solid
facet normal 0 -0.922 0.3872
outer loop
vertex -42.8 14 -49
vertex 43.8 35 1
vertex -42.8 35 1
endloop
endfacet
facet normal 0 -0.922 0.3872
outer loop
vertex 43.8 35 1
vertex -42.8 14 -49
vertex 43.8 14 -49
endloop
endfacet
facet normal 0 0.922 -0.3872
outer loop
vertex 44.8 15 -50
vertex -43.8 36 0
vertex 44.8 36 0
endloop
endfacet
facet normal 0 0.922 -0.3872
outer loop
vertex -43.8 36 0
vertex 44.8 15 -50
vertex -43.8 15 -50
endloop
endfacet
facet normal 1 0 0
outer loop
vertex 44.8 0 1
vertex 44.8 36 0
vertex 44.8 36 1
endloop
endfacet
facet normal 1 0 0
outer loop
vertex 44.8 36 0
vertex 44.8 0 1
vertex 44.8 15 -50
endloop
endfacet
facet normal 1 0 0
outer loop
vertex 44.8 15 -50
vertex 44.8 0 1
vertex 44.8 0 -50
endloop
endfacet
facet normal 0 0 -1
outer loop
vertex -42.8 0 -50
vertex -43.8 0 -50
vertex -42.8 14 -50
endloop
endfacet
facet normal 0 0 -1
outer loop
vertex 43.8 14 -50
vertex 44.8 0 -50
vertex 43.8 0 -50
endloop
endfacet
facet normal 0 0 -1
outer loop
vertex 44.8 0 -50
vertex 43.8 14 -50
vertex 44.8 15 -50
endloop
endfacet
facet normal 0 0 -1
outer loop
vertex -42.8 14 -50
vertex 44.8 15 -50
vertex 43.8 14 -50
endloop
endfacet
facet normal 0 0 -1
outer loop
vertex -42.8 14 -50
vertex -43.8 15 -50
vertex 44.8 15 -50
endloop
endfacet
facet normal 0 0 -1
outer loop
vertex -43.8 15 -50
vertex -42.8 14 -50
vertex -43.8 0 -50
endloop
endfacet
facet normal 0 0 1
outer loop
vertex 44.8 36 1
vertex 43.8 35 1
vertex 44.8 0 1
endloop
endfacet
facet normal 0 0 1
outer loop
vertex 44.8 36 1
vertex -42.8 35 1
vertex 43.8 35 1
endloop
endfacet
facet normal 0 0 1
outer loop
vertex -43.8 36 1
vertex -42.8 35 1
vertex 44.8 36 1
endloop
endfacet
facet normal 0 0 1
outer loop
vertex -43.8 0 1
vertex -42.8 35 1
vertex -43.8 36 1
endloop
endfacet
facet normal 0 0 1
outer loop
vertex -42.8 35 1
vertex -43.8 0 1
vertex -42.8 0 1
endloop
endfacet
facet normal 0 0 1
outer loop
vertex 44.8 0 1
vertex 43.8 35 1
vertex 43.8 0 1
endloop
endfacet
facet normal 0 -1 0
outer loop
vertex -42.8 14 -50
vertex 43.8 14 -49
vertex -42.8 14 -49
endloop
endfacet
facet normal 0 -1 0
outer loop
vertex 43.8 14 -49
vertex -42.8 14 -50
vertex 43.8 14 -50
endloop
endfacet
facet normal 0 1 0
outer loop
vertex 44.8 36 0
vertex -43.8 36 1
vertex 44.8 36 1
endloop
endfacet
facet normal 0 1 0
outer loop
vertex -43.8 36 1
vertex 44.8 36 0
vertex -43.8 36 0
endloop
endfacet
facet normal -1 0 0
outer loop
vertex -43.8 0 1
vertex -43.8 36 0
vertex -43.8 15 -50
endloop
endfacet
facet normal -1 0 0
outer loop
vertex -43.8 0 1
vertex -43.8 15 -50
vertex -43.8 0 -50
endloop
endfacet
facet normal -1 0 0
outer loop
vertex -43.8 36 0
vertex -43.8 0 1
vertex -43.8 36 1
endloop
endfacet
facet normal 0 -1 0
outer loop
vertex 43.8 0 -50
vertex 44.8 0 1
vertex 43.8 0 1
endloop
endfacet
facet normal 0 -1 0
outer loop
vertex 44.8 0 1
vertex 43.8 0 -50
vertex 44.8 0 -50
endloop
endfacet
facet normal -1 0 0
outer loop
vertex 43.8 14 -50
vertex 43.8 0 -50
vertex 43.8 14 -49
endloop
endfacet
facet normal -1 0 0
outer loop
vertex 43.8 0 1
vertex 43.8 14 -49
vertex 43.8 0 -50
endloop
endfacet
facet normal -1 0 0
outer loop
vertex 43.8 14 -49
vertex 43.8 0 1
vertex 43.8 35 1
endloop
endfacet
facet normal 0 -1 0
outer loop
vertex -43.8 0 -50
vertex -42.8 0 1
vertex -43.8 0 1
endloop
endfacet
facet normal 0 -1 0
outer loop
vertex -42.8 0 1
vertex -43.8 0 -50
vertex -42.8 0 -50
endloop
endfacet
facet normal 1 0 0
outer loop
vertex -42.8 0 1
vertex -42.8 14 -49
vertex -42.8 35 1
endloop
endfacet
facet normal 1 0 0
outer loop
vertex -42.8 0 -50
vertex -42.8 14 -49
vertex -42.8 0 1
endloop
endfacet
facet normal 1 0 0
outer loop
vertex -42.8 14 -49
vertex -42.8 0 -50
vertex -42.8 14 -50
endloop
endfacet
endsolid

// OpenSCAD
hull() {
    translate([43.8, 35, 0])  cube(1);
    translate([43.8, 14, -50]) cube(1);
    translate([-43.8, 14, -50]) cube(1);
    translate([-43.8, 35, 0]) cube(1);
}

hull() {
    translate([43.8, 35, 0])  cube(1);
    translate([43.8, 14, -50]) cube(1);
    translate([43.8, 0, -50]) cube(1);
    translate([43.8, 0, 0]) cube(1);
}

hull() {
    translate([-43.8, 35, 0])  cube(1);
    translate([-43.8, 14, -50]) cube(1);
    translate([-43.8, 0, -50]) cube(1);
    translate([-43.8, 0, 0]) cube(1);
}
